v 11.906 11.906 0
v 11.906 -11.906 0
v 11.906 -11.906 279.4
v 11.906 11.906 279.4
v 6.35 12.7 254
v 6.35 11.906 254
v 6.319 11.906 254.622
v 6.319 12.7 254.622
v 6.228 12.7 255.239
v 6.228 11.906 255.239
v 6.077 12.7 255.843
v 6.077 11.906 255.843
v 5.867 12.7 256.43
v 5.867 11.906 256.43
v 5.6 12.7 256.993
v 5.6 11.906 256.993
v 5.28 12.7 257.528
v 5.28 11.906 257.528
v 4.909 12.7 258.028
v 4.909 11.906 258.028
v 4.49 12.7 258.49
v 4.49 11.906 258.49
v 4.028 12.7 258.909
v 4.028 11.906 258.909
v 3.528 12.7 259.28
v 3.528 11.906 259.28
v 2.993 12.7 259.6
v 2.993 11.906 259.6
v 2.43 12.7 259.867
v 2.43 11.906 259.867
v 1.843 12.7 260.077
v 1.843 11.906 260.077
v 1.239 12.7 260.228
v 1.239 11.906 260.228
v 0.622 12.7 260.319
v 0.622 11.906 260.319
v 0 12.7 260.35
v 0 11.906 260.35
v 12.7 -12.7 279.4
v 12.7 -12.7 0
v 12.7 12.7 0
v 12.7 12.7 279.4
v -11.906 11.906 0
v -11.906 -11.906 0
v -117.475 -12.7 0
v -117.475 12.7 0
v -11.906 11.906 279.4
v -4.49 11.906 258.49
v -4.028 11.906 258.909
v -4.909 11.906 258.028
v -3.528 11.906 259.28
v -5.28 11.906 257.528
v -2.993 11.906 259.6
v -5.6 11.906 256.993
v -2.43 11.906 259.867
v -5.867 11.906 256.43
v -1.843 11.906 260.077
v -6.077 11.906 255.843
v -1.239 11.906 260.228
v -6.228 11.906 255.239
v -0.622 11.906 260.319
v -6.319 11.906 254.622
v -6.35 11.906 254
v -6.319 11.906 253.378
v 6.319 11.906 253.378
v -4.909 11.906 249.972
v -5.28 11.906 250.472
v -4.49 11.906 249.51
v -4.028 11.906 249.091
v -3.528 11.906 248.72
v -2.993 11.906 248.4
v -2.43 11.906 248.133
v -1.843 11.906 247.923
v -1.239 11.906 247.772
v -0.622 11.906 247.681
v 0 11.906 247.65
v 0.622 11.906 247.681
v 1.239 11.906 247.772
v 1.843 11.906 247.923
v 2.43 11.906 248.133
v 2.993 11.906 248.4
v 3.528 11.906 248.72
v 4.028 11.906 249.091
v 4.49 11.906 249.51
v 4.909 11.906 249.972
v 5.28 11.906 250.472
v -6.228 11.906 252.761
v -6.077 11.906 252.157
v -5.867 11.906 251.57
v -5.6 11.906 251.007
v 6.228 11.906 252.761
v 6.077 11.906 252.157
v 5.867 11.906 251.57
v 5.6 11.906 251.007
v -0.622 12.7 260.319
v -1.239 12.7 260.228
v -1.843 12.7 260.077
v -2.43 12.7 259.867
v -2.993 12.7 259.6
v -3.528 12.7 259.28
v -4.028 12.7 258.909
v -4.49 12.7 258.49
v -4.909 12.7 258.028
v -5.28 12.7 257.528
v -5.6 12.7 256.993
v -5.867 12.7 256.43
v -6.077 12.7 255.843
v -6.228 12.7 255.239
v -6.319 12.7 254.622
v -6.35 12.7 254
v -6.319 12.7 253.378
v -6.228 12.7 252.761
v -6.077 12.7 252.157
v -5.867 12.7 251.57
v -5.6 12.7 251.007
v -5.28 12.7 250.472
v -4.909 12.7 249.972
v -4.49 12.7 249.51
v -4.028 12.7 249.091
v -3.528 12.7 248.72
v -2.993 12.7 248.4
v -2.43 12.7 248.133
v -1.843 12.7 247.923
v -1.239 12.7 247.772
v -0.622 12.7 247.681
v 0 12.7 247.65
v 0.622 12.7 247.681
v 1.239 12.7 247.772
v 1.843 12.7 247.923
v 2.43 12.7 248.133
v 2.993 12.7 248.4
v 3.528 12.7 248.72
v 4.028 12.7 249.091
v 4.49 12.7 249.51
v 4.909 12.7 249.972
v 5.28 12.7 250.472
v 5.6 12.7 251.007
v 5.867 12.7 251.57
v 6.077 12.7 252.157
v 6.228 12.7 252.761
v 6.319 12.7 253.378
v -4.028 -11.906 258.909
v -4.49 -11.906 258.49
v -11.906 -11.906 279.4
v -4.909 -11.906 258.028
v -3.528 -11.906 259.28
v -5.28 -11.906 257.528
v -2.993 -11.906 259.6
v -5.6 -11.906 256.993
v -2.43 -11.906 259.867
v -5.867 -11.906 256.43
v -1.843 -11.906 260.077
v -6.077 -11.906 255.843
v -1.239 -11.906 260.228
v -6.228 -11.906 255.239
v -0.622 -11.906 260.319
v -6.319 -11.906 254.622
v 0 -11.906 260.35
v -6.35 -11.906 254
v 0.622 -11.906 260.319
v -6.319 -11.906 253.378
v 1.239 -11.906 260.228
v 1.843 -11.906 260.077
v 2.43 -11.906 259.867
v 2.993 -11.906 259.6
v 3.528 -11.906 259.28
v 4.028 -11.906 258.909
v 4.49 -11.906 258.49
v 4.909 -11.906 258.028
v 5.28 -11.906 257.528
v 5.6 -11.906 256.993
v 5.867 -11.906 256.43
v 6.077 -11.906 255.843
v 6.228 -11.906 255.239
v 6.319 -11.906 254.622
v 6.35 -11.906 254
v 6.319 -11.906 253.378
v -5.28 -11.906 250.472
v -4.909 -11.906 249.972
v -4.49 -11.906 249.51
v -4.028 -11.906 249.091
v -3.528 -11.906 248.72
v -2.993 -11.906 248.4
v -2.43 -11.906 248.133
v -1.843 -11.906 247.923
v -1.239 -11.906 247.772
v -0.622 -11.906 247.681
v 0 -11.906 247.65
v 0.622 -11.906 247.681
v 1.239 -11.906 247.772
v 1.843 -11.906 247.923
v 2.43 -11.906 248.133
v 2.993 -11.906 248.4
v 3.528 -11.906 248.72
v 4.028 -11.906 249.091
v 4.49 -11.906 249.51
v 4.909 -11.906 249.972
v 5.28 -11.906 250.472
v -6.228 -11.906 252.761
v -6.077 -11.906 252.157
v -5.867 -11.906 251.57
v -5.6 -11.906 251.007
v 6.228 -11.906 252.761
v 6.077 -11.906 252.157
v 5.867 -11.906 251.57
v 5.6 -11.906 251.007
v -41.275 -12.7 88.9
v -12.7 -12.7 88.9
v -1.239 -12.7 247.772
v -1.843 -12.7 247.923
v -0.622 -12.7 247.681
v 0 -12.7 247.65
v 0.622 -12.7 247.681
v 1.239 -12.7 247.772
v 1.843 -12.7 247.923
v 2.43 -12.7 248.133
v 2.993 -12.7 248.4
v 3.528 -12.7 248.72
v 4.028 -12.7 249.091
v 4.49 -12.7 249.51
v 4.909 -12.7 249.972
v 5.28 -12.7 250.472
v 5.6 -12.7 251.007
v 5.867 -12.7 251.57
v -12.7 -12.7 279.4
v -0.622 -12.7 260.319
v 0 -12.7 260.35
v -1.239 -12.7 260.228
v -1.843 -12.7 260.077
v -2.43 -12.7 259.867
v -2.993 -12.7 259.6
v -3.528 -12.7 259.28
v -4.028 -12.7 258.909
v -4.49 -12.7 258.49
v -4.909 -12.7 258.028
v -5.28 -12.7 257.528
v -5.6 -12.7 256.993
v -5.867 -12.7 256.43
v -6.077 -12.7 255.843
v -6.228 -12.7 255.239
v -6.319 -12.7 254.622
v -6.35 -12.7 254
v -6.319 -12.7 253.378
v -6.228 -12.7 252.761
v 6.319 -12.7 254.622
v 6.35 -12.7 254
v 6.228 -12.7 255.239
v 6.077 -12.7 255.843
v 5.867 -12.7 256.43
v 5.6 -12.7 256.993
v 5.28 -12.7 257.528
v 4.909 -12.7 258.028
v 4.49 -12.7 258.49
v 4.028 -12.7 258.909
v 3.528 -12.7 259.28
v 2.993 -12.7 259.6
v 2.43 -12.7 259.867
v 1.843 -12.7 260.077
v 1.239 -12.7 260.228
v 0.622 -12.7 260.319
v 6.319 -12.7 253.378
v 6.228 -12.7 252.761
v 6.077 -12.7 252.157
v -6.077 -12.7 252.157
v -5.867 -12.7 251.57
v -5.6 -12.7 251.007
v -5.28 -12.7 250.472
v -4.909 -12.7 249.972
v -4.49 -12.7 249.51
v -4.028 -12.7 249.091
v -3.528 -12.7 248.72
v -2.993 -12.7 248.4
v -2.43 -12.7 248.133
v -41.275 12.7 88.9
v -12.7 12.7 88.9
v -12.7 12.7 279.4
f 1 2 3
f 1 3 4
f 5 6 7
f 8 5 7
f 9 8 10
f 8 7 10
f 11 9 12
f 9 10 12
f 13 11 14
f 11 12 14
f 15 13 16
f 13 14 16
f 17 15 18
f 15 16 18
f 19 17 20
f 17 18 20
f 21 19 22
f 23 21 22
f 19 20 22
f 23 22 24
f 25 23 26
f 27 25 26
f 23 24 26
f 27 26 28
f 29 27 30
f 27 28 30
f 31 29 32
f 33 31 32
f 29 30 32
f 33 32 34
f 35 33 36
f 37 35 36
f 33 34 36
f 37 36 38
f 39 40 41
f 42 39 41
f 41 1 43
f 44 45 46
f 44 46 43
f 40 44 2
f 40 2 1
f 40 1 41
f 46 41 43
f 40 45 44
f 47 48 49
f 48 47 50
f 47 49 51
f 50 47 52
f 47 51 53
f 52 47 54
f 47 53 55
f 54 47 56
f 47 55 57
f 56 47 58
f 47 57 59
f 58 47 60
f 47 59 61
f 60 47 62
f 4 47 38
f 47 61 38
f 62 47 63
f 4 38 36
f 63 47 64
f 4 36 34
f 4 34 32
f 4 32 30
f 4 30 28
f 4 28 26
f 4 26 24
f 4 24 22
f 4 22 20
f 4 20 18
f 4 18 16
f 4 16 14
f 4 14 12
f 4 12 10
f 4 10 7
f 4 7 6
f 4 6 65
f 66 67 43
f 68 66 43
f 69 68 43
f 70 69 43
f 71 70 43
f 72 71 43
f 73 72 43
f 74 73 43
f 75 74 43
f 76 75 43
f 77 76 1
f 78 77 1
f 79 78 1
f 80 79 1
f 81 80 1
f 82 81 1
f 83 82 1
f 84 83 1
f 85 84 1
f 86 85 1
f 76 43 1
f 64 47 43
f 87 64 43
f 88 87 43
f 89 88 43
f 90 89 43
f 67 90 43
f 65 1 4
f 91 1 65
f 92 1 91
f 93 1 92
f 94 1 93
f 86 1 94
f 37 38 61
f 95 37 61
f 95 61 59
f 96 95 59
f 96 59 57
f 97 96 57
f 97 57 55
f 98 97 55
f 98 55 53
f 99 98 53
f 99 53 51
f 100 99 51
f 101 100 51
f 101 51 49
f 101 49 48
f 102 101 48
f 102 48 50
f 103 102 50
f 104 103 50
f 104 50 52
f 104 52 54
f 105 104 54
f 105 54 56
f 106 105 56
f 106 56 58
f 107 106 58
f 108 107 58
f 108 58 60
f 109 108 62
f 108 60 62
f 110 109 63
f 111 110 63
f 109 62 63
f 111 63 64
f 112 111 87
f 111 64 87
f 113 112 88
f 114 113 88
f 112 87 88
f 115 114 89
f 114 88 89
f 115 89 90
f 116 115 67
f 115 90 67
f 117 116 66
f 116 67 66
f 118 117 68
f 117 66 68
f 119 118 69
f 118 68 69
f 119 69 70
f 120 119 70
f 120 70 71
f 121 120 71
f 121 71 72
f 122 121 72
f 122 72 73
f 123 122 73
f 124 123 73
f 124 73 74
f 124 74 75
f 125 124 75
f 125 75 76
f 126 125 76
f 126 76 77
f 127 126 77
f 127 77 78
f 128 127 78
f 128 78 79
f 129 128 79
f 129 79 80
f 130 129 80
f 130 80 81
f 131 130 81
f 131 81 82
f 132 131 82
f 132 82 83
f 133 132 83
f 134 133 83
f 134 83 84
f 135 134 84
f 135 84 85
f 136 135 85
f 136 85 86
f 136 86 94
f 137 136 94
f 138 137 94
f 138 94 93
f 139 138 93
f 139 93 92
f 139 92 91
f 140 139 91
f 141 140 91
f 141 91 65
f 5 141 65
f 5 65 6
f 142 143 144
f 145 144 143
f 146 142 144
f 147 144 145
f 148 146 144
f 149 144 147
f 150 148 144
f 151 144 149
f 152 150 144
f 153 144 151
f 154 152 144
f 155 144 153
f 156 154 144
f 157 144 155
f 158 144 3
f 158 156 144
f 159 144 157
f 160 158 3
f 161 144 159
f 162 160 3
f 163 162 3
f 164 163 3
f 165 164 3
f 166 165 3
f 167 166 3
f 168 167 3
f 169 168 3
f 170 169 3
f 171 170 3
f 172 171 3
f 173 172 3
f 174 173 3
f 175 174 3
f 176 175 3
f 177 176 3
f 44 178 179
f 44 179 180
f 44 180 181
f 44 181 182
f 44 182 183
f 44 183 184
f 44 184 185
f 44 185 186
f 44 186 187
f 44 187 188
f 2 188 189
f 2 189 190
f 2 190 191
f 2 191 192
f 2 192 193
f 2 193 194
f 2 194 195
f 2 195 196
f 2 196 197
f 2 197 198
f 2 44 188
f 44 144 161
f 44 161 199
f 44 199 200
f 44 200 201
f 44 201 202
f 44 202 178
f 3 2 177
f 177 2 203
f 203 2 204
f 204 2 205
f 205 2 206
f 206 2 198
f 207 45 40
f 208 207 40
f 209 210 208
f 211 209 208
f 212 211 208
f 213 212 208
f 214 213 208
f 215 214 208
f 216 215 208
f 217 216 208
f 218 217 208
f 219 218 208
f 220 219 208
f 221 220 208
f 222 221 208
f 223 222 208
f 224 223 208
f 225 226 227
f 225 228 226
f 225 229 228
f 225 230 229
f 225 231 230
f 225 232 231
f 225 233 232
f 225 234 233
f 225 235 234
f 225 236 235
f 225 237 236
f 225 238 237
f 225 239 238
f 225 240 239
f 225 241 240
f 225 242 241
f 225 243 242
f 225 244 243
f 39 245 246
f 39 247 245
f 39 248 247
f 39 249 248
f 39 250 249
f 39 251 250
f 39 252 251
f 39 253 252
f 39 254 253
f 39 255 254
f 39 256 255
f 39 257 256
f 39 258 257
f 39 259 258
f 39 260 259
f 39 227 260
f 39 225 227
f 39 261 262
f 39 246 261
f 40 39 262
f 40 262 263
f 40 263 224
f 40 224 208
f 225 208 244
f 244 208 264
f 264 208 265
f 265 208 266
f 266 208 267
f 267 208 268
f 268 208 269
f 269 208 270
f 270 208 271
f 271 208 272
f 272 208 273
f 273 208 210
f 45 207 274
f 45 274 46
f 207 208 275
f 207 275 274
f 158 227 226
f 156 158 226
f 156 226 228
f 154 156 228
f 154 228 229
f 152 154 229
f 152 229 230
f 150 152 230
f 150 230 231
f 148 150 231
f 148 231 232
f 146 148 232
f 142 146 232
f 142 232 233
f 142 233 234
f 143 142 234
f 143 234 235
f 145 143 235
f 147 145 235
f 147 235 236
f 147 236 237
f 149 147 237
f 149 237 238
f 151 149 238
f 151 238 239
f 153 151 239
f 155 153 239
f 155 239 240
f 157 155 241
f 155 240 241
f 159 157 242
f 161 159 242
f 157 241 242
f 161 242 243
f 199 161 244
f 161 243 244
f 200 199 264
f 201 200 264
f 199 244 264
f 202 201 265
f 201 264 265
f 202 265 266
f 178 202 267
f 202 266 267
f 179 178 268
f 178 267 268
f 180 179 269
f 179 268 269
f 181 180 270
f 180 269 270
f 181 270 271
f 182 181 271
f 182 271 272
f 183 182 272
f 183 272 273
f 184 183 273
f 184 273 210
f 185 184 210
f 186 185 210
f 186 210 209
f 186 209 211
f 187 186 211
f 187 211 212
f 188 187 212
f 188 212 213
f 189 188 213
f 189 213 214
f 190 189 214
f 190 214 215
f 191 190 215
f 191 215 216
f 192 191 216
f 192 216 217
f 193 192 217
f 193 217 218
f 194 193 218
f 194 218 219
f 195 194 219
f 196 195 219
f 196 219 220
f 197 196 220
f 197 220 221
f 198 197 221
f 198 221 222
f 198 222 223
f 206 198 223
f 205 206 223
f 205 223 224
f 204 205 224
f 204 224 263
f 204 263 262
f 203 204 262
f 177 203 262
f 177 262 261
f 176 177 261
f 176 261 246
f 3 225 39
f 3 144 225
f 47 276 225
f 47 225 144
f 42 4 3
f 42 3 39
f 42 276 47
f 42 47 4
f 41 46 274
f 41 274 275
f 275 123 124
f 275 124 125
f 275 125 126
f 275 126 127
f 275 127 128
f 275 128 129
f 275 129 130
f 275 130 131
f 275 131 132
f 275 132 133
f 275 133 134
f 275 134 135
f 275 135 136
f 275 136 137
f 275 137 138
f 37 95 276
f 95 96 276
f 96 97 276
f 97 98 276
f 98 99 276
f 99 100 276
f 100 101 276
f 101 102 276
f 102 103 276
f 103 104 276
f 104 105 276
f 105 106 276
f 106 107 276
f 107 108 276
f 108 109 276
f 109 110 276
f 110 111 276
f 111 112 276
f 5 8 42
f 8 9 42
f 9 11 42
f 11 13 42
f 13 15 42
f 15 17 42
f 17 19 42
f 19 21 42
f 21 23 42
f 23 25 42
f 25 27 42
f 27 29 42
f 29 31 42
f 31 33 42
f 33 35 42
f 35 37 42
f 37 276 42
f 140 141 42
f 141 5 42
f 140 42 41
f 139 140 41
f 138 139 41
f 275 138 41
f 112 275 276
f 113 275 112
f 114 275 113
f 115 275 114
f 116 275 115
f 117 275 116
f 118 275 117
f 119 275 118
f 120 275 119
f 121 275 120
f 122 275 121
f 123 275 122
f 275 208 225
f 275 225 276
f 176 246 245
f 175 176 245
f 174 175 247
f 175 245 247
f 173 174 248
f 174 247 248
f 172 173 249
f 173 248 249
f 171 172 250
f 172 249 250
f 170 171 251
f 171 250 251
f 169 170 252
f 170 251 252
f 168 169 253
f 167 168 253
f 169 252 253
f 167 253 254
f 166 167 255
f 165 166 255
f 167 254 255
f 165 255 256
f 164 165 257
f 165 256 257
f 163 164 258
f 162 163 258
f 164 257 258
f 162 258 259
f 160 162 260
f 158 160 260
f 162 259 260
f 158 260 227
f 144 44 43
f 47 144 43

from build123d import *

# Parameters (mm, degrees)
F0_W     = 25.4
F0_H     = 25.4
F0_W_2   = 23.8125
F0_H_2   = 23.8125
F1_DEPTH = 279.4
F3_DEPTH = 25.4
F6_DEPTH = 25.4


with BuildPart() as f1:
    # F0 (on Top) → F1 (new body)
    with BuildSketch(Plane.XY):
        Rectangle(F0_W, F0_H)
        Rectangle(F0_W_2, F0_H_2, mode=Mode.SUBTRACT)
    extrude(amount=F1_DEPTH)


with BuildPart() as f3:
    # F2 (on face) → F3 (new body)
    with BuildSketch(Plane.XZ.offset(12.7)):
        Polygon((-117.475, 0), (-12.7, 0), (-12.7, 88.9), (-41.275, 88.9), align=None)
    extrude(amount=-F3_DEPTH)


with BuildPart() as f1_1:
    add(f1.part)

    # F4: union F3
    add(f3.part)

    # F5 (on face) → F6 (cut)
    with BuildSketch(Plane.XZ.offset(12.7)):
        with BuildLine():
            ThreePointArc((6.35, 254), (4.4901280605, 258.4901280605), (0, 260.35))
            ThreePointArc((0, 260.35), (-4.4901280605, 249.5098719395), (6.35, 254))
        make_face()
    extrude(amount=-F6_DEPTH, mode=Mode.SUBTRACT)


solid = f1_1.part
